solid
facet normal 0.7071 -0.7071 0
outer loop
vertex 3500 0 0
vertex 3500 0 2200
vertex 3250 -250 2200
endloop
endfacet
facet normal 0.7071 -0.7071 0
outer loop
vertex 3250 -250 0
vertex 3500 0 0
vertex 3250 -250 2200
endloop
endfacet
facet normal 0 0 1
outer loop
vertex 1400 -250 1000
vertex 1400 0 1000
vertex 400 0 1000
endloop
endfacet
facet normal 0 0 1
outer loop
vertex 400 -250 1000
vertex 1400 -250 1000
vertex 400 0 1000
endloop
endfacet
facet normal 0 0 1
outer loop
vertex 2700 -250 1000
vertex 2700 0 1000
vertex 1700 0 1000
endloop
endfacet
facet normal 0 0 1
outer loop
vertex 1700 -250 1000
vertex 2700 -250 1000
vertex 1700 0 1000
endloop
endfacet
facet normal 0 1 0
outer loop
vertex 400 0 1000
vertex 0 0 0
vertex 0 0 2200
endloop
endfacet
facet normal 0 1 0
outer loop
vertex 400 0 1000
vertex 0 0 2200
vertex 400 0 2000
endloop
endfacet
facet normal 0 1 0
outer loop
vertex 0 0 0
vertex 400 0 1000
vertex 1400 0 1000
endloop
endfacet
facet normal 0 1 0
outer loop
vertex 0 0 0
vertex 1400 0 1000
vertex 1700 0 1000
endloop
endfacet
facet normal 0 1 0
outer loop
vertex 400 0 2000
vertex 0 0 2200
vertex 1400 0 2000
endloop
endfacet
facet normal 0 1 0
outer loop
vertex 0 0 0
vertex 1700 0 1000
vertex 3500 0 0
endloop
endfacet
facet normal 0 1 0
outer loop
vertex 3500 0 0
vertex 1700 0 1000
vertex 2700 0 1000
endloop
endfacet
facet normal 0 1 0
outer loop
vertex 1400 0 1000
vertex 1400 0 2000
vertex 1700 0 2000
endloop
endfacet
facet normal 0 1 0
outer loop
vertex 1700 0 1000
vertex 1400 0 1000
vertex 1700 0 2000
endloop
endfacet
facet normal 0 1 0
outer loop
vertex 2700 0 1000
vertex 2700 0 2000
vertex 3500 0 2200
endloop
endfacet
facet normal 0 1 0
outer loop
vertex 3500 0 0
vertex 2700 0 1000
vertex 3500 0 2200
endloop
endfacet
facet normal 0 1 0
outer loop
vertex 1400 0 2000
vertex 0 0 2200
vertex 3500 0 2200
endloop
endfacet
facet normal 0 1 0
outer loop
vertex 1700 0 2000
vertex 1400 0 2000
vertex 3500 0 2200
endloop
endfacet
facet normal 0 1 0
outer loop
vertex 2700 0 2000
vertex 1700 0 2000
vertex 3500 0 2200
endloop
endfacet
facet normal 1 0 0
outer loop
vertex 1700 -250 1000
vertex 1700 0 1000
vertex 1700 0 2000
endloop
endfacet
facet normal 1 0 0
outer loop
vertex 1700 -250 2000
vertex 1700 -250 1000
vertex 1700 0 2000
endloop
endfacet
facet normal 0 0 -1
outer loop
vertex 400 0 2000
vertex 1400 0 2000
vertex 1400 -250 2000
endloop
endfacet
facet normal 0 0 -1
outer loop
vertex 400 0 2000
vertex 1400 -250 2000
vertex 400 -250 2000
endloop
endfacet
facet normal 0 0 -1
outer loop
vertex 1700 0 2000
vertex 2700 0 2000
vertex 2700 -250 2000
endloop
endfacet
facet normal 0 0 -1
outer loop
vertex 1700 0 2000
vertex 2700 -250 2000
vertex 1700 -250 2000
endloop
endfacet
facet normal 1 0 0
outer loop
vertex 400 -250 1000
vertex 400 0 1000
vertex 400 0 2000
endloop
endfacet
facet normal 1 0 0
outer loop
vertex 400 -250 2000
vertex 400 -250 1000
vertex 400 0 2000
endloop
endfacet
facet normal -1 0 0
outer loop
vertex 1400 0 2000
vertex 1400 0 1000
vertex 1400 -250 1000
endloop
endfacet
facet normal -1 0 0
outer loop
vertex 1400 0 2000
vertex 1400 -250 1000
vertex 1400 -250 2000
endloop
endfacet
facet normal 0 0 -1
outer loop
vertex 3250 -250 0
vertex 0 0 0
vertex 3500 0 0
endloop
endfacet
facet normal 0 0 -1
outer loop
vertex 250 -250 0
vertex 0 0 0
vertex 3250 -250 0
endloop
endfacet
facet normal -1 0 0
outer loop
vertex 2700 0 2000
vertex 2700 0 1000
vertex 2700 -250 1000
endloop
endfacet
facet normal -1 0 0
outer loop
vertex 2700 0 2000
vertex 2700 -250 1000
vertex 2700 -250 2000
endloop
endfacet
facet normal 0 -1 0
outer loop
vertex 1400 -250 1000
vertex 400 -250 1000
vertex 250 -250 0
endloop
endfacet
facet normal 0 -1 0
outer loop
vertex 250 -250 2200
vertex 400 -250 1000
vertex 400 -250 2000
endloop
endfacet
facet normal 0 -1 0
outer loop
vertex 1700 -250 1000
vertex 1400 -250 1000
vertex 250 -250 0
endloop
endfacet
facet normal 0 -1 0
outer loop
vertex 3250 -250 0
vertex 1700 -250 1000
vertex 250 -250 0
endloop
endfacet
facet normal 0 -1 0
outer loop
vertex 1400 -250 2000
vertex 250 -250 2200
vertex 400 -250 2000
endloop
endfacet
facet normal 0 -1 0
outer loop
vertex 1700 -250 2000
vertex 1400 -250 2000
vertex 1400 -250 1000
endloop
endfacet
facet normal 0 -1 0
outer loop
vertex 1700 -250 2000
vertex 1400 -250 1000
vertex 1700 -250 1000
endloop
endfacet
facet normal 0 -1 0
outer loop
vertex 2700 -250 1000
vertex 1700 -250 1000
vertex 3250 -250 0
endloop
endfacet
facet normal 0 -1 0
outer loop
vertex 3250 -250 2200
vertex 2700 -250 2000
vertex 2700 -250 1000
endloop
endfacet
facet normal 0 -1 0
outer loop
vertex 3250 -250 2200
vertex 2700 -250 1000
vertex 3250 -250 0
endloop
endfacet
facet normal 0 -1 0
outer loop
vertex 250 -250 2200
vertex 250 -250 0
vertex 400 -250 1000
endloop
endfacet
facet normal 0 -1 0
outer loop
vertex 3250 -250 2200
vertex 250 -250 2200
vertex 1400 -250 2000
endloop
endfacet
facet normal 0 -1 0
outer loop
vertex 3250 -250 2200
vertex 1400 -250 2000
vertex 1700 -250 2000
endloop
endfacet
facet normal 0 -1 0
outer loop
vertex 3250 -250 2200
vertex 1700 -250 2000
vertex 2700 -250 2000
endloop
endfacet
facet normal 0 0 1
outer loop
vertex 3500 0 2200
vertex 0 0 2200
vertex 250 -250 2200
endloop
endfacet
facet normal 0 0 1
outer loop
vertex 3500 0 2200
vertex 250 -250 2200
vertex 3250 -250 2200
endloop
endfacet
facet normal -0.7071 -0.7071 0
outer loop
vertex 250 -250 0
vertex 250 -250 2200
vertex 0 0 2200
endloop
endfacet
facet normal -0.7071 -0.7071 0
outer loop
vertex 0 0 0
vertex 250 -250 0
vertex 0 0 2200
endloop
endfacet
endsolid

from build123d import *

# Parameters (mm, degrees)
F0_W     = 3500
F0_H     = 2200
F1_DEPTH = 250
F3_DEPTH = 2200.001
F4_W     = 1000
F4_H     = 1000
F5_DEPTH = 250.001


with BuildPart() as f1:
    # F0 (on Front) → F1 (new body)
    with BuildSketch(Plane.XZ):
        with Locations((1750, 1100)):
            Rectangle(F0_W, F0_H)
    extrude(amount=F1_DEPTH)

    # F2 (on face) → F3 (cut, through all)
    with BuildSketch(Plane.XY.offset(2200)):
        Polygon((250, -250), (0, 0), (0, -250), align=None)
        Polygon((3250, -250), (3500, -250), (3500, 0), align=None)
    extrude(amount=-F3_DEPTH, mode=Mode.SUBTRACT)

    # F4 (on face) → F5 (cut, through all)
    with BuildSketch(Plane(origin=(0, 0, 0), x_dir=(-1, 0, 0), z_dir=(0, 1, 0))):
        with Locations((-2200, 1500)):
            Rectangle(F4_W, F4_H)
        with Locations((-900, 1500)):
            Rectangle(F4_W, F4_H)
    extrude(amount=-F5_DEPTH, mode=Mode.SUBTRACT)


solid = f1.part
